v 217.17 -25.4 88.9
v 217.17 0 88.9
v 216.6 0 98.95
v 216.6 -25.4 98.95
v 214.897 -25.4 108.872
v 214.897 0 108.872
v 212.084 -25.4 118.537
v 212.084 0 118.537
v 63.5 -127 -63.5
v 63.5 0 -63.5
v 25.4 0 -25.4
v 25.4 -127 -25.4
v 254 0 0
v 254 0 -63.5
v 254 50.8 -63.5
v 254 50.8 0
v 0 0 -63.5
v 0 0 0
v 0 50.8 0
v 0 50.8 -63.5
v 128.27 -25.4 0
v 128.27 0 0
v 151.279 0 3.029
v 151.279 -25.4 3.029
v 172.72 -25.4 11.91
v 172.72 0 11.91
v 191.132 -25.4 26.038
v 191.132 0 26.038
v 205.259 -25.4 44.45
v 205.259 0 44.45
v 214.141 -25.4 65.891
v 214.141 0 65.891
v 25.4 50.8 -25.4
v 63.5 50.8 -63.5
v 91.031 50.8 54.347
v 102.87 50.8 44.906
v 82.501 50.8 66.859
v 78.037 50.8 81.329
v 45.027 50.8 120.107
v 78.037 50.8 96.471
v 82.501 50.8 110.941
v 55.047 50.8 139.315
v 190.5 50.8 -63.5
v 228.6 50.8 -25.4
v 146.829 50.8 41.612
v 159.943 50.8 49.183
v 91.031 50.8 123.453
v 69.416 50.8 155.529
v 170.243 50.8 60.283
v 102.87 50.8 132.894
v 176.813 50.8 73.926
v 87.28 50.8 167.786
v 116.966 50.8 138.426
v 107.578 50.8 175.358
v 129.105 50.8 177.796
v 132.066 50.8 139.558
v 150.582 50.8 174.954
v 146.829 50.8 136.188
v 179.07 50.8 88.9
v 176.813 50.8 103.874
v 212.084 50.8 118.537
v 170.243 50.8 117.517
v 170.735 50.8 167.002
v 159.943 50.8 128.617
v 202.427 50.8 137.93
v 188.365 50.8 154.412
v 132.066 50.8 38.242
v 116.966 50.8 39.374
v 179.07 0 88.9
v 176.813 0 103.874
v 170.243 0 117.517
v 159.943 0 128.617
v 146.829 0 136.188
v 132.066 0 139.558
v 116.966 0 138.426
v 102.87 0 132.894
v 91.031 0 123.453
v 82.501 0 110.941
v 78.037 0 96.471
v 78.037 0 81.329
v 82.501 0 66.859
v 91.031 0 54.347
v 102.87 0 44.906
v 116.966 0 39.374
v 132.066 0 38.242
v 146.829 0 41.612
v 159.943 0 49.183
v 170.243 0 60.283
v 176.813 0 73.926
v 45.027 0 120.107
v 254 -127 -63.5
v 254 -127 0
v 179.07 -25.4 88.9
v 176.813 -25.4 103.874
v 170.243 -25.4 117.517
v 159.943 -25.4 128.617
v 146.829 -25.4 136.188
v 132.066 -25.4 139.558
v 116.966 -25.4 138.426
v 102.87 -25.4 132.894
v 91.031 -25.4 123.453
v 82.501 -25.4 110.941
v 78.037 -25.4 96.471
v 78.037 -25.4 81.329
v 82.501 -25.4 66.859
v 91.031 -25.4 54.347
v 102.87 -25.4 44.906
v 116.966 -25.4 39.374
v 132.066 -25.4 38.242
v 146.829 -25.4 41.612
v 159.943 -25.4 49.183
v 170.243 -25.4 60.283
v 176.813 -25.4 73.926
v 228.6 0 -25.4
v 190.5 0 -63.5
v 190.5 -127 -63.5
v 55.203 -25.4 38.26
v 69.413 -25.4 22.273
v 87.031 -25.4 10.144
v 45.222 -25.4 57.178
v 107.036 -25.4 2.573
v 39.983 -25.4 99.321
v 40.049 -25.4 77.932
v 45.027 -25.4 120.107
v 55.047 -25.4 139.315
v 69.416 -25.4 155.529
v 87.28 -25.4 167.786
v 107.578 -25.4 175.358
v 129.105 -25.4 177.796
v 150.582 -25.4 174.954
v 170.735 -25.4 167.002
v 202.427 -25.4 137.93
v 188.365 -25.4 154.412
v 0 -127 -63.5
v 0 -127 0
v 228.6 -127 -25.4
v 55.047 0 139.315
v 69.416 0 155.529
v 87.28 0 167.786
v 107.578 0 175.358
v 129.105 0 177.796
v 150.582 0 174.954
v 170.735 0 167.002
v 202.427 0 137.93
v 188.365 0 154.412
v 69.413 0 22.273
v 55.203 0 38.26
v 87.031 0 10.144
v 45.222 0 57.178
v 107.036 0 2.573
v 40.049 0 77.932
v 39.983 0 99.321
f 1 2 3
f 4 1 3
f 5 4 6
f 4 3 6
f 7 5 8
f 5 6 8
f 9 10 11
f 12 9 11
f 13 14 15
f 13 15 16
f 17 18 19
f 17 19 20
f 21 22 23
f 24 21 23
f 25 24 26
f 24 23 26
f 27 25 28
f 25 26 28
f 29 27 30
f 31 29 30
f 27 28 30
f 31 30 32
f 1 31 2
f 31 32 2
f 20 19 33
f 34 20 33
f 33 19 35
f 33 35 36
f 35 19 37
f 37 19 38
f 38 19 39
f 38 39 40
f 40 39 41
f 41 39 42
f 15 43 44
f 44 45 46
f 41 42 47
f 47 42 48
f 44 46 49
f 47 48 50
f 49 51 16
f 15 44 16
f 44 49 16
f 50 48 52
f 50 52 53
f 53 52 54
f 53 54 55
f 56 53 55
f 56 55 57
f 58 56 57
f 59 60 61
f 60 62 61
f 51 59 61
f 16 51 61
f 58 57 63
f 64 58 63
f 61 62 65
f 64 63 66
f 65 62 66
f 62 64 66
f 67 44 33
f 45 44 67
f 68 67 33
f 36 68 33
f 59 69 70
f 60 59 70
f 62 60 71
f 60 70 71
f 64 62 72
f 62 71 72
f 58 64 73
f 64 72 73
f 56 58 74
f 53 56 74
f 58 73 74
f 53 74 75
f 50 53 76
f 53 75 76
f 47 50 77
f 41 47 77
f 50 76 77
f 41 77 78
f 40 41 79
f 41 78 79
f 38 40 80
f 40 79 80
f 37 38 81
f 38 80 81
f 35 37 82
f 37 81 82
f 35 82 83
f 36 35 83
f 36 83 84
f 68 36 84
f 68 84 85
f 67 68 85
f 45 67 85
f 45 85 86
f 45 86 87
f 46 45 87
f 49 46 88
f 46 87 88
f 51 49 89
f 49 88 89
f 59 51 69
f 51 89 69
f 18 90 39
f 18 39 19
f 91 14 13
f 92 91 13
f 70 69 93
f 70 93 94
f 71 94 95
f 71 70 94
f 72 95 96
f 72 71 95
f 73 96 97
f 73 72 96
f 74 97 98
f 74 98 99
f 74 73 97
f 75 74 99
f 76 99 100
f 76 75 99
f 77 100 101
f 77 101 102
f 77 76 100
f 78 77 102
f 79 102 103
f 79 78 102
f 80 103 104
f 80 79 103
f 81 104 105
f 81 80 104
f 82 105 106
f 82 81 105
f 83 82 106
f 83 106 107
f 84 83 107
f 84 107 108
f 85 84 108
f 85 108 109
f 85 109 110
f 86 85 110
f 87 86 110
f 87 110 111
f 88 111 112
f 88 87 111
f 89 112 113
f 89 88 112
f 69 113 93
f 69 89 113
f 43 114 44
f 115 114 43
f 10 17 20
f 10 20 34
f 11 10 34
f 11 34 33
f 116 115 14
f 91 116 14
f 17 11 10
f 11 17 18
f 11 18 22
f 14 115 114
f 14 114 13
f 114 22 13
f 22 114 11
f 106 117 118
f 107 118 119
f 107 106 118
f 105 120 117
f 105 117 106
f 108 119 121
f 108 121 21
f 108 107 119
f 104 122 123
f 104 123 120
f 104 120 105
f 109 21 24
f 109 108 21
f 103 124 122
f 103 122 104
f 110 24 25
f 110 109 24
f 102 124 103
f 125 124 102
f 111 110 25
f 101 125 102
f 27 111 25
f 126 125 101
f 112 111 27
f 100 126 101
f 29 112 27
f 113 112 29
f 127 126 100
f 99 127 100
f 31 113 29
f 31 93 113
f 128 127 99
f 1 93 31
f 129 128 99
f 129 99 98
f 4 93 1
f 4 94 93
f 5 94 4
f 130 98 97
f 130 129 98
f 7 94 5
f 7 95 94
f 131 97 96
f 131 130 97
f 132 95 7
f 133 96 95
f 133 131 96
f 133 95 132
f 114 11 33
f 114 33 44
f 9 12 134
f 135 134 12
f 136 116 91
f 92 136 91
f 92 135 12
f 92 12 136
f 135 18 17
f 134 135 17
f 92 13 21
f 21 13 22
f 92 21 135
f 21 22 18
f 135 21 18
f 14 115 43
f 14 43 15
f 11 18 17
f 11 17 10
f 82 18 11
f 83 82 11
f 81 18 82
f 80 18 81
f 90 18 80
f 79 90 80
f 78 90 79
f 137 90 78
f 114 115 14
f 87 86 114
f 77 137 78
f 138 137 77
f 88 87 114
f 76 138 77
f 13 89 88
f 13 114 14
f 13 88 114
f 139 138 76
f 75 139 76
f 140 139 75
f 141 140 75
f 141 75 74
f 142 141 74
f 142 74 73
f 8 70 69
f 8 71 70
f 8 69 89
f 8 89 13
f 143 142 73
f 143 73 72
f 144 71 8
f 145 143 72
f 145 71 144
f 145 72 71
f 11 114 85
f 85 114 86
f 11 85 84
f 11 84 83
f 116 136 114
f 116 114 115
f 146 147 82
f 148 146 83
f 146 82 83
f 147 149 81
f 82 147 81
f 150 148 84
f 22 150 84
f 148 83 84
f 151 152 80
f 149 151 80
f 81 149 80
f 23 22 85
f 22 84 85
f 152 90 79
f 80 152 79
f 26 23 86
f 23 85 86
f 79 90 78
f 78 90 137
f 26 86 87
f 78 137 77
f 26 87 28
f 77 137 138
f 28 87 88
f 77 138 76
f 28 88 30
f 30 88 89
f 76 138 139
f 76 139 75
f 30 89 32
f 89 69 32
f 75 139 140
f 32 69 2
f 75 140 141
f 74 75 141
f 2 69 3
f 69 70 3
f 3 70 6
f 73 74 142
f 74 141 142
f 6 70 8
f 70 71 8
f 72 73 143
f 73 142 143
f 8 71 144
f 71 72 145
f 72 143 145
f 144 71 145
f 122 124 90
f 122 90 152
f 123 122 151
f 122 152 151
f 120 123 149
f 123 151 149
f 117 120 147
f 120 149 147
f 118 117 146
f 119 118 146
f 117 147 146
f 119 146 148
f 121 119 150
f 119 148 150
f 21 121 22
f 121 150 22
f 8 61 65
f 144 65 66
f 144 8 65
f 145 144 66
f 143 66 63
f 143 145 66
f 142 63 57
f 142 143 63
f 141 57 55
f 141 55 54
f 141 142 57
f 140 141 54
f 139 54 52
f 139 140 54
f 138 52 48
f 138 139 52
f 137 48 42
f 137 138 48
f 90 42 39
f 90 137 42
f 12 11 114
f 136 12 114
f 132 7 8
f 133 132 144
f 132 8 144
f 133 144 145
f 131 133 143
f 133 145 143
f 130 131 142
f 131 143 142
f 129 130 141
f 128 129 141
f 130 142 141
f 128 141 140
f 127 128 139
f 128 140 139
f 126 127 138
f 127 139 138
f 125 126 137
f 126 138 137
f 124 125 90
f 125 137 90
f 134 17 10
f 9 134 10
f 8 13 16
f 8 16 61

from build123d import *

# Parameters (mm, degrees)
F1_DEPTH = 127
F0_R     = 50.8
F2_DEPTH = 25.4
F3_DEPTH = 50.8


with BuildPart() as f1:
    # F0 (on Front) → F1 (new body)
    with BuildSketch(Plane.XZ):
        Polygon((128.269819, 0), (0, 0), (0, -63.5), (63.5, -63.5), (25.4, -25.4), (228.6, -25.4), (190.5, -63.5), (254, -63.5), (254, 0), align=None)
    extrude(amount=F1_DEPTH)

    # F0 (on Front) → F2 (join)
    with BuildSketch(Plane.XZ):
        with BuildLine():
            ThreePointArc((45.027212, 120.107022), (55.20302, 38.259573), (128.269819, 0))
            ThreePointArc((128.269819, 0), (191.131612, 26.038207), (217.169819, 88.9))
            ThreePointArc((217.169819, 88.9), (215.88916, 103.935332), (212.084078, 118.537478))
            ThreePointArc((212.084078, 118.537478), (129.105022, 177.796077), (45.027212, 120.107022))
        make_face()
        with Locations((128.269819, 88.9)):
            Circle(F0_R, mode=Mode.SUBTRACT)
    extrude(amount=F2_DEPTH)


with BuildPart() as f3:
    # F0 (on Front) → F3 (new body)
    with BuildSketch(Plane.XZ):
        with BuildLine():
            Line((45.027212, 120.107022), (0, 0))
            Line((0, 0), (128.269819, 0))
            ThreePointArc((128.269819, 0), (55.20302, 38.259573), (45.027212, 120.107022))
        make_face()
        with BuildLine():
            ThreePointArc((217.169819, 88.9), (191.131612, 26.038207), (128.269819, 0))
            Line((128.269819, 0), (254, 0))
            Line((254, 0), (212.084078, 118.537478))
            ThreePointArc((212.084078, 118.537478), (215.88916, 103.935332), (217.169819, 88.9))
        make_face()
        with BuildLine():
            ThreePointArc((45.027212, 120.107022), (55.20302, 38.259573), (128.269819, 0))
            ThreePointArc((128.269819, 0), (191.131612, 26.038207), (217.169819, 88.9))
            ThreePointArc((217.169819, 88.9), (215.88916, 103.935332), (212.084078, 118.537478))
            ThreePointArc((212.084078, 118.537478), (129.105022, 177.796077), (45.027212, 120.107022))
        make_face()
        with Locations((128.269819, 88.9)):
            Circle(F0_R, mode=Mode.SUBTRACT)
        Polygon((128.269819, 0), (0, 0), (0, -63.5), (63.5, -63.5), (25.4, -25.4), (228.6, -25.4), (190.5, -63.5), (254, -63.5), (254, 0), align=None)
    extrude(amount=-F3_DEPTH)


solid = Compound([f1.part, f3.part])
